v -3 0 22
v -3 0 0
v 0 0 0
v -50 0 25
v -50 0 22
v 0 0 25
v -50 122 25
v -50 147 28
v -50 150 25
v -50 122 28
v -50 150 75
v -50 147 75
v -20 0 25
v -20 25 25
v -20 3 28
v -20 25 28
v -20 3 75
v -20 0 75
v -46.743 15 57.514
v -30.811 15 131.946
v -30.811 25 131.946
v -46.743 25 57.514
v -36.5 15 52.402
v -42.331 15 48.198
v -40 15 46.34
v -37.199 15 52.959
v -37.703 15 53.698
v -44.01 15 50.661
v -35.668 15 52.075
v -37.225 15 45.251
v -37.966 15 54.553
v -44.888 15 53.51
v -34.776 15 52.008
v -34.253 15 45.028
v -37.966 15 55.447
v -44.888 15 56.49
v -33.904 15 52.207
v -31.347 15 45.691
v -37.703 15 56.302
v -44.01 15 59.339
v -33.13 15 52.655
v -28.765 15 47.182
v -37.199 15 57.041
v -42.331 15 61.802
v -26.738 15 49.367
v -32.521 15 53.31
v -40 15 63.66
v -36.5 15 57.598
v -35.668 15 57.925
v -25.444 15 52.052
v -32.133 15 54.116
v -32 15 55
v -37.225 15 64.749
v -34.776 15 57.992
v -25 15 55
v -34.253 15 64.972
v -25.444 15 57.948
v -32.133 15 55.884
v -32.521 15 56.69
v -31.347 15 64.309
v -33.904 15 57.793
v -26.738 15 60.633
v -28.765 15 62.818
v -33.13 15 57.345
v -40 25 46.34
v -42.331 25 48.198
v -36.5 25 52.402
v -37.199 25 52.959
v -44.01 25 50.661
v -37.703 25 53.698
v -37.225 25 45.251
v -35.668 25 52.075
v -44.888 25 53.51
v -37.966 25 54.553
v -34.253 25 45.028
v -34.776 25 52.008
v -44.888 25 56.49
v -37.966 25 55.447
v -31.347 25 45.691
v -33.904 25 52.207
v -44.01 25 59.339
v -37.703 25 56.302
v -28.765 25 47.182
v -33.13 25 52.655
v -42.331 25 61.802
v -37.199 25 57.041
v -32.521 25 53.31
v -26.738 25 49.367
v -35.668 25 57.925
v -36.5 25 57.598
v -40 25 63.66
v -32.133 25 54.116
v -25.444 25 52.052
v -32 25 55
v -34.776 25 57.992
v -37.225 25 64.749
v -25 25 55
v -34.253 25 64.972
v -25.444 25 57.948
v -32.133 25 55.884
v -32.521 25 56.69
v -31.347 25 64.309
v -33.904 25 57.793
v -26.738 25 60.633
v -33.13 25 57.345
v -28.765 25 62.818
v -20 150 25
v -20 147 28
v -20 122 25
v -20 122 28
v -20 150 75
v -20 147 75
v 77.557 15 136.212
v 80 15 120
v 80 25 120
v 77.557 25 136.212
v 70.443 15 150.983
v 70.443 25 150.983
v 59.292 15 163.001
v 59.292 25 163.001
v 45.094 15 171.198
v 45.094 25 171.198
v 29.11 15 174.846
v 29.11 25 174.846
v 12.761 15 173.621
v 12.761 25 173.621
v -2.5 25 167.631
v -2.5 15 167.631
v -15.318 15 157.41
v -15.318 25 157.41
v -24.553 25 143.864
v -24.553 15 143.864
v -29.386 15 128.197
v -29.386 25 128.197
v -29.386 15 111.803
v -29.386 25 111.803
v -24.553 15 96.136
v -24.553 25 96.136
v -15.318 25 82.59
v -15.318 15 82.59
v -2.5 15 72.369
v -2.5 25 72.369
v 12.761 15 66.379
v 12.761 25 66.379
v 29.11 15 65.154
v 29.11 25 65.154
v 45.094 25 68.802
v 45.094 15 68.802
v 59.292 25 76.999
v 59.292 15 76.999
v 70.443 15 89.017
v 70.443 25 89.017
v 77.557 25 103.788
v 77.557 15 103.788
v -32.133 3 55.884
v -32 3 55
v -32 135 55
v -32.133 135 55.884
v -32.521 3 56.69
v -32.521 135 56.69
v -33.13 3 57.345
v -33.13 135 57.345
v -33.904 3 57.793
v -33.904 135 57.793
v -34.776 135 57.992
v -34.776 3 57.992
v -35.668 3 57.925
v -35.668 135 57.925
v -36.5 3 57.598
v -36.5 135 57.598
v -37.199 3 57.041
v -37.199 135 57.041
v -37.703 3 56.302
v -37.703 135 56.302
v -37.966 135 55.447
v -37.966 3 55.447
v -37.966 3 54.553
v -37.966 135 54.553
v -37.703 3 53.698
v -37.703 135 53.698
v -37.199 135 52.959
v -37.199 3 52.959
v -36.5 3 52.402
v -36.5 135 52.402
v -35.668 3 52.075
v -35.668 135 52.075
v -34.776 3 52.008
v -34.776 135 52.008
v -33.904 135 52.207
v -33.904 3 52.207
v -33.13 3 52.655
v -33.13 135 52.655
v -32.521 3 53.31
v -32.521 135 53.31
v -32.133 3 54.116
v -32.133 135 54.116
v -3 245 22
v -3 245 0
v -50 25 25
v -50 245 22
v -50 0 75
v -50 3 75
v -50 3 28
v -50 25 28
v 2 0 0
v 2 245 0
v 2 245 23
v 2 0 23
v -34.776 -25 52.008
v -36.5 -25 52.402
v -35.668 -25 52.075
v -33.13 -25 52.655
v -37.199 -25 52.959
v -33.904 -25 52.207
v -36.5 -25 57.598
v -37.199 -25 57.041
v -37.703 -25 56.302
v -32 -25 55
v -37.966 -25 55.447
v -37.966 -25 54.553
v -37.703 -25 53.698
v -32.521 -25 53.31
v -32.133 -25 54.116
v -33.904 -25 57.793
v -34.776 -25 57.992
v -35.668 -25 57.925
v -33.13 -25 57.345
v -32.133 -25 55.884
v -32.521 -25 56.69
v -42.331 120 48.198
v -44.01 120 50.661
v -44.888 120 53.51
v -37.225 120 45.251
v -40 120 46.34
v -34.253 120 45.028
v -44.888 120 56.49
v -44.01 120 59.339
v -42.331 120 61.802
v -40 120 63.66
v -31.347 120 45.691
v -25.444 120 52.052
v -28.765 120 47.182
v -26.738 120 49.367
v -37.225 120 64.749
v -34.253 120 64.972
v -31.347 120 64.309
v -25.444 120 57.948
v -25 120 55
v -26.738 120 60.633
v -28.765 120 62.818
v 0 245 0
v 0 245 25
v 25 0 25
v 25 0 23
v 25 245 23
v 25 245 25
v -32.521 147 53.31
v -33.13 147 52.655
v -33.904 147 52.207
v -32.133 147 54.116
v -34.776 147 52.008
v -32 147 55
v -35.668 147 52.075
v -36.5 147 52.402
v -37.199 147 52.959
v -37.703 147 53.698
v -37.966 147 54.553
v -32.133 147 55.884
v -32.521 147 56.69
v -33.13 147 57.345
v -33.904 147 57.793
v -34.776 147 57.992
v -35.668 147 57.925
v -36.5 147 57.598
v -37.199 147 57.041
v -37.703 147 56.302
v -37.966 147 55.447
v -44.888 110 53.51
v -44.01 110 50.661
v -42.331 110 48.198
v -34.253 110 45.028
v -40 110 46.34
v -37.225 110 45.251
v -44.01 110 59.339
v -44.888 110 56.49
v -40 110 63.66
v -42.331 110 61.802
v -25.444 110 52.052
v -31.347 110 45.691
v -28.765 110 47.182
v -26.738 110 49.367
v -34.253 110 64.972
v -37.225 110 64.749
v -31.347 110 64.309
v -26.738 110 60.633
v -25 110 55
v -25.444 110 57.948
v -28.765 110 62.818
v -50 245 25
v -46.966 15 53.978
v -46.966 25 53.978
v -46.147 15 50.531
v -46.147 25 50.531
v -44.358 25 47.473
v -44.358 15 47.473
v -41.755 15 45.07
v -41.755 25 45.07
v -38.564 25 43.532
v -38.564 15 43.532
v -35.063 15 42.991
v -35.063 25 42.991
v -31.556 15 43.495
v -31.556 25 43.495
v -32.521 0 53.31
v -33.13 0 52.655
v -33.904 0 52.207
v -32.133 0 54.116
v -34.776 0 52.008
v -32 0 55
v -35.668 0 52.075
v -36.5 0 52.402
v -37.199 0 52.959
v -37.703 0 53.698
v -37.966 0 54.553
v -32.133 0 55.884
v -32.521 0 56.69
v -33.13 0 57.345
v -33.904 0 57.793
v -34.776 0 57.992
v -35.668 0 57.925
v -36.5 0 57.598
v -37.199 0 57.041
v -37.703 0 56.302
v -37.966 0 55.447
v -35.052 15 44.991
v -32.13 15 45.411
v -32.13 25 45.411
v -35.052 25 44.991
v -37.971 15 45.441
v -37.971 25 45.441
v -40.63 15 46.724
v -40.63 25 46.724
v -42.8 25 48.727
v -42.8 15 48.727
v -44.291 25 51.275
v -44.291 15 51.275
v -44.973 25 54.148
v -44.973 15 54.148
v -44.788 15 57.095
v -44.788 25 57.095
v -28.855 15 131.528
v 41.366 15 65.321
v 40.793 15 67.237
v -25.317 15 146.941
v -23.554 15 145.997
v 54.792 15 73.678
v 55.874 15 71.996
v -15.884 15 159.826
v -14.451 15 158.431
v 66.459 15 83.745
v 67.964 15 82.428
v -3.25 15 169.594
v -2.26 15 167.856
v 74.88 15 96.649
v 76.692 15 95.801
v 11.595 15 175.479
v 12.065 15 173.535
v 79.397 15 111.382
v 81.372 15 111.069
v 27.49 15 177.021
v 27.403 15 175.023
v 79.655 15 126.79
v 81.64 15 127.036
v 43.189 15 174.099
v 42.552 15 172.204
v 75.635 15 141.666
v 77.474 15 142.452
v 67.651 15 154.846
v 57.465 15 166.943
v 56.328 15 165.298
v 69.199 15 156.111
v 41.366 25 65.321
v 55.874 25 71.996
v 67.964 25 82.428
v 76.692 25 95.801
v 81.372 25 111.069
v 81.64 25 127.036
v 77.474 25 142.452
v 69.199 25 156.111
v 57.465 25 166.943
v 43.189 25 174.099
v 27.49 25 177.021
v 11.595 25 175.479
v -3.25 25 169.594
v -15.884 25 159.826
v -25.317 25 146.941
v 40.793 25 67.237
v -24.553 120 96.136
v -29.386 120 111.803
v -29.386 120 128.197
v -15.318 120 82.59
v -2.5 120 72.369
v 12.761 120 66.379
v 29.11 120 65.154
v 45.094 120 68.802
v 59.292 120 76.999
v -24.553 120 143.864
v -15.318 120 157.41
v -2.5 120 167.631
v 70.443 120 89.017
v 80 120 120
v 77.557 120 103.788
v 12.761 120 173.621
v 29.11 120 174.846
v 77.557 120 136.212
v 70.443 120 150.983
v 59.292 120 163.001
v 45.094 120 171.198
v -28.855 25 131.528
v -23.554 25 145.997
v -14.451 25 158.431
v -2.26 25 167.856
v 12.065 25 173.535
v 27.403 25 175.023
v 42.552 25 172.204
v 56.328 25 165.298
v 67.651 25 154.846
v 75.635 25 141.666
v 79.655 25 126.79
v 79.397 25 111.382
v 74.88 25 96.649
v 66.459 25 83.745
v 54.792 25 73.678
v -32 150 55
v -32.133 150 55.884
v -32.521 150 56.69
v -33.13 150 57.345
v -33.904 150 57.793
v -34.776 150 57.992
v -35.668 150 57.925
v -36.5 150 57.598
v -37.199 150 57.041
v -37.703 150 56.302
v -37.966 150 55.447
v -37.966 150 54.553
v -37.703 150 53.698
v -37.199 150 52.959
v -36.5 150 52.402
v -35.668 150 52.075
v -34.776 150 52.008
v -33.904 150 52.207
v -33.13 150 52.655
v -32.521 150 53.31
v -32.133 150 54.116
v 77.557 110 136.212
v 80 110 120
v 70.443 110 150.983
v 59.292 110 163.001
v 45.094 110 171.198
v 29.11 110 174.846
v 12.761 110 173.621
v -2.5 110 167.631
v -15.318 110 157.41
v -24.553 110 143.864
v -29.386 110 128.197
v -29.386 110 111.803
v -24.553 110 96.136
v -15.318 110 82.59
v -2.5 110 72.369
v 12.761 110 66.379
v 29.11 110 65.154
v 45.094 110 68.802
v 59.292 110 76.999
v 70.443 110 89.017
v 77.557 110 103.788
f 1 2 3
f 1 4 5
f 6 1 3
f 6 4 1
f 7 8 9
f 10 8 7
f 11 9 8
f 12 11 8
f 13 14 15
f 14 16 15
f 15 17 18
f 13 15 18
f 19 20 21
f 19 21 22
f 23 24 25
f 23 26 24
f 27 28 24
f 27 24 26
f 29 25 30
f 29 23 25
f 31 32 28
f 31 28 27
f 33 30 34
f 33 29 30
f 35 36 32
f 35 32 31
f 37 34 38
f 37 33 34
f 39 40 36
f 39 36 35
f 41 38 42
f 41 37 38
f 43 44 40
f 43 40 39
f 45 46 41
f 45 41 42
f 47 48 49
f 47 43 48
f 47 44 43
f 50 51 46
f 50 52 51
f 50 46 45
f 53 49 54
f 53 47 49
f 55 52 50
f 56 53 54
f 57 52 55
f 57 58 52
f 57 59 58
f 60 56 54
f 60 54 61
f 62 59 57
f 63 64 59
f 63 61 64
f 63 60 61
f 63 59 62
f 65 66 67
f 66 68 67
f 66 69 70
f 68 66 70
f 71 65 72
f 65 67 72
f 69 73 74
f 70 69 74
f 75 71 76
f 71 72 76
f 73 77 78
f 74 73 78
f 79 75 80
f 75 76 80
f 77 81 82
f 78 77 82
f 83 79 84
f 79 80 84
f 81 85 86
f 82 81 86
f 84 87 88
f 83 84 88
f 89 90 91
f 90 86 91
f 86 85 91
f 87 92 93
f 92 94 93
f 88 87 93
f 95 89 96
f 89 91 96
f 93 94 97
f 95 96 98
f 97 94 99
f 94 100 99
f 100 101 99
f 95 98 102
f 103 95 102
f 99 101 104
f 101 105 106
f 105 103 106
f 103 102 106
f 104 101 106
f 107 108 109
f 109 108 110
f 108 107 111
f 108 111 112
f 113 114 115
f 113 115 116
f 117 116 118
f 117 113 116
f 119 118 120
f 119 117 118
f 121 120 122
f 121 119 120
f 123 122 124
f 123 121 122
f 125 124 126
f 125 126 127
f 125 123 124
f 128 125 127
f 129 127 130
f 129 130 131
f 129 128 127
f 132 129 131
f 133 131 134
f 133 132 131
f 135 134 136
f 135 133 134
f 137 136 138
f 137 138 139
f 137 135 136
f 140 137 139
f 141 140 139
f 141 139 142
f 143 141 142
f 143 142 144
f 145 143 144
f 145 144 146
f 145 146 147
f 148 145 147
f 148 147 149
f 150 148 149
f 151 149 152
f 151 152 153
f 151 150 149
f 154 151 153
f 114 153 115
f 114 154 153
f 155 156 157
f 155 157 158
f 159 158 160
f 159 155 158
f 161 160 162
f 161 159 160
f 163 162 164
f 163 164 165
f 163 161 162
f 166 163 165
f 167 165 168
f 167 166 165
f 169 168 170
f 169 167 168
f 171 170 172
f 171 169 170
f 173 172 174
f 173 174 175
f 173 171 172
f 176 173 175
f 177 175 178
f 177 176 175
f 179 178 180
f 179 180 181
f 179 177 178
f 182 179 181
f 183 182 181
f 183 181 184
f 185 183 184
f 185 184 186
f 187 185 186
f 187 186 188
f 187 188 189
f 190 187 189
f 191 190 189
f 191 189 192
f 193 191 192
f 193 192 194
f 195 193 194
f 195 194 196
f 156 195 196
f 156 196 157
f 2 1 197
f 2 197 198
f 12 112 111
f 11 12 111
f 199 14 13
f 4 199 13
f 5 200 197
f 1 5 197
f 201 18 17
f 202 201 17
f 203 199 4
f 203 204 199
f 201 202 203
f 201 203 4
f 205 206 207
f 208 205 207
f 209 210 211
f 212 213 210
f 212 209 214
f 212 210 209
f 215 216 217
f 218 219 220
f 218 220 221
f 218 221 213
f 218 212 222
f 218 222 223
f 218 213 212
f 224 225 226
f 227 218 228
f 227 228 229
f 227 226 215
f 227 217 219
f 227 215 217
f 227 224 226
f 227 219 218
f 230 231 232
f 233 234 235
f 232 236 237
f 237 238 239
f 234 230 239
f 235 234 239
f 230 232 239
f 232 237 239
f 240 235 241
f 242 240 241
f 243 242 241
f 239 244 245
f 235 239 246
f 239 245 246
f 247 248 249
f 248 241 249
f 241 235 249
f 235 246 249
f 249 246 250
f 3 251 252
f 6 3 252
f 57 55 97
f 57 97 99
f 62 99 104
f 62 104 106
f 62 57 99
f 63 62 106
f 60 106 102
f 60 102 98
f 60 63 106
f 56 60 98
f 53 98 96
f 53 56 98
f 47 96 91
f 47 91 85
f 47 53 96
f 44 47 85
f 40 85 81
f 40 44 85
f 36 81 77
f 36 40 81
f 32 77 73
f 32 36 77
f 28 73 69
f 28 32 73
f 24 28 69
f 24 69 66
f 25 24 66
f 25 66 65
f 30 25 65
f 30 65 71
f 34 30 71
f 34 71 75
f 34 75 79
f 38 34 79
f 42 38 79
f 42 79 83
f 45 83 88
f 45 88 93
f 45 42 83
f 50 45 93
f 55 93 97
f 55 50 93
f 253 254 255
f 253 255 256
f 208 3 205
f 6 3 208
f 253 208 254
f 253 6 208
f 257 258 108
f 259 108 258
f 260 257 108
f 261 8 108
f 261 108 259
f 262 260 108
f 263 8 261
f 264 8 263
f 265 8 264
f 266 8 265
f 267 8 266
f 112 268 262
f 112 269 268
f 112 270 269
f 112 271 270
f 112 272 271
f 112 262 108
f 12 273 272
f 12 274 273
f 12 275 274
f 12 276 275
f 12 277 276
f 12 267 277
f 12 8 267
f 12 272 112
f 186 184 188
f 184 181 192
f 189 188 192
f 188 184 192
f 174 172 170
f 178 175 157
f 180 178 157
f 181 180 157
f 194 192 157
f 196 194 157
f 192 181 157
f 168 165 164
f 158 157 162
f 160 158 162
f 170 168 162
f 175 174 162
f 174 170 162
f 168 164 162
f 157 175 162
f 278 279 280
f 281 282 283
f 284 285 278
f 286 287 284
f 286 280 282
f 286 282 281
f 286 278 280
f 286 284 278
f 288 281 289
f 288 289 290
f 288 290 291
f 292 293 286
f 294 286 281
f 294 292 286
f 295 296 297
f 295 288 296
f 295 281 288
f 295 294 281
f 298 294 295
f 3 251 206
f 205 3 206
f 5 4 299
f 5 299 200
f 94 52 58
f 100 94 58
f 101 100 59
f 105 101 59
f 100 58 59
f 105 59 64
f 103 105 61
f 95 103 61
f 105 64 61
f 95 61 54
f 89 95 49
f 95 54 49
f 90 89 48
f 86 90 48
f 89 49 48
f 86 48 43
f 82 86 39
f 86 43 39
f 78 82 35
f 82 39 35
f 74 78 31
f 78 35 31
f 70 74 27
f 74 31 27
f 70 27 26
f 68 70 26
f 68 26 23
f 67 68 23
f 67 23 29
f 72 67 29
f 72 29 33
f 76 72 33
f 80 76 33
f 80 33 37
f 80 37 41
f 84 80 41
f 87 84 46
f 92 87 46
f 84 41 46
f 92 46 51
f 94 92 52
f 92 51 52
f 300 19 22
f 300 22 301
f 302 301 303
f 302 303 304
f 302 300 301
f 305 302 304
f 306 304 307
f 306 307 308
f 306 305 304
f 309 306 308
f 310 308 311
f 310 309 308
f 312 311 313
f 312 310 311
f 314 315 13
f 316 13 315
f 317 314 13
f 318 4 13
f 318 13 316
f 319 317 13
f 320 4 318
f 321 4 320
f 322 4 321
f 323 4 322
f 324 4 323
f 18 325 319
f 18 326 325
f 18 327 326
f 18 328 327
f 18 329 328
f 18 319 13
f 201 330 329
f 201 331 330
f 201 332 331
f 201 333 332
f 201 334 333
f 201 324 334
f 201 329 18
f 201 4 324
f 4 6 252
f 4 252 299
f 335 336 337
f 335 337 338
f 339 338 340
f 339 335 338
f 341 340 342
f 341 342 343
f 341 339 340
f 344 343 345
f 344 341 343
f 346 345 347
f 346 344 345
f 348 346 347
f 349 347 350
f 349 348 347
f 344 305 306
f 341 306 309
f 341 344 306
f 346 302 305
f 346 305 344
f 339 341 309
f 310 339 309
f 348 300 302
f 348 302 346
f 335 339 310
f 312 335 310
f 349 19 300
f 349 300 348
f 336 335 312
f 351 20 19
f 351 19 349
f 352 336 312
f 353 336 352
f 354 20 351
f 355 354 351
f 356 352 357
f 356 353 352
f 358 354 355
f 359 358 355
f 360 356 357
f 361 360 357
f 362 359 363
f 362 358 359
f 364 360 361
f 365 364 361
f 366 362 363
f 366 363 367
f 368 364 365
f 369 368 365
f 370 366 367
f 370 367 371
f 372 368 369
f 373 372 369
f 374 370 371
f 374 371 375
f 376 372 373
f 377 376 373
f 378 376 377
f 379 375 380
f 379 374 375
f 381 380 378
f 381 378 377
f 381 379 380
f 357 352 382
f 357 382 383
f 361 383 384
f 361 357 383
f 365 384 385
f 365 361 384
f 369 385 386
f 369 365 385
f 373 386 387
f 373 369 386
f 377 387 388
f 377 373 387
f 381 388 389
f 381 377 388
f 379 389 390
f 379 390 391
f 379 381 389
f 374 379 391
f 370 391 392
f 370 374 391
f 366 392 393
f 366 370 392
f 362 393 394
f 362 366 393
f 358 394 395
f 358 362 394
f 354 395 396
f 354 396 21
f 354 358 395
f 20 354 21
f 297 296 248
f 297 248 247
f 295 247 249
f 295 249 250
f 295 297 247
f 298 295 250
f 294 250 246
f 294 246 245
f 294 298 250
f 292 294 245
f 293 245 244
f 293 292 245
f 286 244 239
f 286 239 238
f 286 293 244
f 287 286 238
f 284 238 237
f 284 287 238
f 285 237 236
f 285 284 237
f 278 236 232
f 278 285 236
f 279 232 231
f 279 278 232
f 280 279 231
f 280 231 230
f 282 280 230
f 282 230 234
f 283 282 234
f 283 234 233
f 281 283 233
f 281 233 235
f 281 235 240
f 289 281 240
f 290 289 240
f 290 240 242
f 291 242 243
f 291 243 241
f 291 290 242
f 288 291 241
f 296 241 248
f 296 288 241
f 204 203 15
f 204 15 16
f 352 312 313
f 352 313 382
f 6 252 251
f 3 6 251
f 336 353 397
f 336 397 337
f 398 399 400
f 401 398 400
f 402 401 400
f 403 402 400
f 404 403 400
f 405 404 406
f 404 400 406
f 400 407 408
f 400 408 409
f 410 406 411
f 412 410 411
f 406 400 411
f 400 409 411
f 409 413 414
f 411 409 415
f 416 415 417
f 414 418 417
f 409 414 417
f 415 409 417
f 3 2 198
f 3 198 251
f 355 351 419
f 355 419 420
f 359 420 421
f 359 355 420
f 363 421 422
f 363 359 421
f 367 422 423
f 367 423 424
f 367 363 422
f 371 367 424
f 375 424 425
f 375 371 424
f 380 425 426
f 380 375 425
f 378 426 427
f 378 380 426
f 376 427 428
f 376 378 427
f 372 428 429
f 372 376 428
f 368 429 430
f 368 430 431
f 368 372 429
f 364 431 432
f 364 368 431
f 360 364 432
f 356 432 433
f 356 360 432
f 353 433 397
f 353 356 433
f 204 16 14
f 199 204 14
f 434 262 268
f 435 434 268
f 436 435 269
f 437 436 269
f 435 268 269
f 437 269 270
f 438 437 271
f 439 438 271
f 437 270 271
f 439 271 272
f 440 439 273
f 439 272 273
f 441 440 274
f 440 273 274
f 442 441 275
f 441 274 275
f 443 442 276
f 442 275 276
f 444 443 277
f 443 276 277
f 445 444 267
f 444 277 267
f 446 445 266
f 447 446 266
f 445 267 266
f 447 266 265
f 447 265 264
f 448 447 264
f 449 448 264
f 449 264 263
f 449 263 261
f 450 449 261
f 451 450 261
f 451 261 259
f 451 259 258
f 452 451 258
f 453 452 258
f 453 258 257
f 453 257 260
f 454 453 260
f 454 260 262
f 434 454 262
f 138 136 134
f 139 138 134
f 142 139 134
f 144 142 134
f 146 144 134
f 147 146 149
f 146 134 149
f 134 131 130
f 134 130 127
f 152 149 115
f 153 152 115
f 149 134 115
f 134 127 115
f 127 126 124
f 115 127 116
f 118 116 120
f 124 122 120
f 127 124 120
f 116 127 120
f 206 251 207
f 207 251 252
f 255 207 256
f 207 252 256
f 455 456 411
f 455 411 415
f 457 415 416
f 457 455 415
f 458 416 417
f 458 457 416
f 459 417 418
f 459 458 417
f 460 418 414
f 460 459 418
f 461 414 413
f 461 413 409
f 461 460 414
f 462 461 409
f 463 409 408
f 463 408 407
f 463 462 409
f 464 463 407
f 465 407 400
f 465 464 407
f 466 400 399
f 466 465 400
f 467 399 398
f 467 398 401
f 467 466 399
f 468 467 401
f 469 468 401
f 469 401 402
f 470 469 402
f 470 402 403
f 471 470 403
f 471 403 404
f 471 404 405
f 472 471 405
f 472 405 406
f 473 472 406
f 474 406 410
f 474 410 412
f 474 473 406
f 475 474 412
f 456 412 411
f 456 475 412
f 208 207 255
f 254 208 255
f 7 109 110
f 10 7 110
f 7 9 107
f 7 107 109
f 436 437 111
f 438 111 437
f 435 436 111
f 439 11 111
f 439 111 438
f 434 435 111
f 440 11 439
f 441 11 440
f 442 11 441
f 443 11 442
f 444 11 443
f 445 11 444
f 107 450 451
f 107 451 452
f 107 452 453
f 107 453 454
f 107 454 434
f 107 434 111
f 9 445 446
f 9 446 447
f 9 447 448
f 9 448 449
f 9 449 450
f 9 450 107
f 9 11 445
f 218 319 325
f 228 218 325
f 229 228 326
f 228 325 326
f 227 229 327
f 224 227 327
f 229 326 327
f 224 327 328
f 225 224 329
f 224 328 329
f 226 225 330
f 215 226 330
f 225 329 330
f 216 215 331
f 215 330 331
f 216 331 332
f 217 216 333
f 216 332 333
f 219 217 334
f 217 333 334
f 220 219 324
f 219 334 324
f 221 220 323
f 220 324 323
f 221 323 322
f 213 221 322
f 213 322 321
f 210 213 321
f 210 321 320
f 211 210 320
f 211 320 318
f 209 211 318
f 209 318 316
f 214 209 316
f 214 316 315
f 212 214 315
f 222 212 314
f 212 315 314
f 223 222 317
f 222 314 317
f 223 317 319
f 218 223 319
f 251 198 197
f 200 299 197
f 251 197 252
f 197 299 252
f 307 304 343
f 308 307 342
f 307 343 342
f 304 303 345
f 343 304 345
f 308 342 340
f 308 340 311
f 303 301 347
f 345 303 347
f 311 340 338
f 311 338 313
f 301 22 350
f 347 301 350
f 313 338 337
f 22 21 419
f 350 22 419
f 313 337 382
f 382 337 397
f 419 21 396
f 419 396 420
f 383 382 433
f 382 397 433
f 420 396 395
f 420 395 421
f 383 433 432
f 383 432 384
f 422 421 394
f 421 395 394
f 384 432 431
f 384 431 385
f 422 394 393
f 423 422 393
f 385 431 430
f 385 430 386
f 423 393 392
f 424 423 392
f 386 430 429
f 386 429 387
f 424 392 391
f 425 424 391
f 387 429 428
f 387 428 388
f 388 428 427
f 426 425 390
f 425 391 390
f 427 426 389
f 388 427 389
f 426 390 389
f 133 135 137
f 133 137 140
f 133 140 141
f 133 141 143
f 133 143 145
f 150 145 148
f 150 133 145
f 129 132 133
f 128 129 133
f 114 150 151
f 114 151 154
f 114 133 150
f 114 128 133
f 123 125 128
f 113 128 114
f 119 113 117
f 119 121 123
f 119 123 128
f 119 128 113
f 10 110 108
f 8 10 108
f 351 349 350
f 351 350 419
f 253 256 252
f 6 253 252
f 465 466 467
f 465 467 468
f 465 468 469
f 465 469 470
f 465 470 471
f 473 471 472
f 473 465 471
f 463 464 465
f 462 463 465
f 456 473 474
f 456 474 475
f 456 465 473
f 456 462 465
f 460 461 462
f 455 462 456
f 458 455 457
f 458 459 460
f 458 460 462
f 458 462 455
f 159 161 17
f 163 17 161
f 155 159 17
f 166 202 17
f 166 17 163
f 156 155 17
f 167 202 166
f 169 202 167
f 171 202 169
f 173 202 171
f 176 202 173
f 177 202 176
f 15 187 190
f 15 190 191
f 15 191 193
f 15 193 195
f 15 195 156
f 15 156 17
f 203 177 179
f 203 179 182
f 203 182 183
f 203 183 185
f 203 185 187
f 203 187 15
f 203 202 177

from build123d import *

# Parameters (mm, degrees)
F3_DEPTH       = 245
F5_DEPTH       = 245
F7_DEPTH       = 30
F8_R           = 3
F9_DEPTH       = 245.001
F10_R          = 3
F11_DEPTH      = 135
F11_DEPTH_BACK = 25
F12_R          = 55
F13_DEPTH      = 10
F12_R_2        = 10
F12_R_3        = 3
F14_R          = 55
F15_DEPTH      = 10
F14_R_2        = 10
F17_DEPTH      = 10


with BuildPart() as f3:
    # F2 (on Front) → F3 (new body)
    with BuildSketch(Plane.XZ):
        Polygon((0, 25), (0, 0), (2, 0), (2, 23), (25, 23), (25, 25), align=None)
    extrude(amount=-F3_DEPTH)


with BuildPart() as f5:
    # F4 (on Front) → F5 (new body)
    with BuildSketch(Plane.XZ):
        Polygon((-3, 0), (0, 0), (0, 25), (-50, 25), (-50, 22), (-3, 22), align=None)
    extrude(amount=-F5_DEPTH)


with BuildPart() as f7:
    # F6 (on face) → F7 (new body)
    with BuildSketch(Plane(origin=(-50, 0, 0), x_dir=(0, -1, 0), z_dir=(-1, 0, 0))):
        Polygon((-25, 25), (0, 25), (0, 75), (-3, 75), (-3, 28), (-25, 28), align=None)
    extrude(amount=-F7_DEPTH)


with BuildPart() as f7b:
    # F6 (on face) → F7, piece 2 (new body)
    with BuildSketch(Plane(origin=(-50, 0, 0), x_dir=(0, -1, 0), z_dir=(-1, 0, 0))):
        Polygon((-150, 75), (-150, 25), (-122, 25), (-122, 28), (-147, 28), (-147, 75), align=None)
    extrude(amount=-F7_DEPTH)


with BuildPart() as f9_tool:
    # F8 (on face) → F9 (new body, through all)
    with BuildSketch(Plane.XZ):
        with Locations((-35, 55)):
            Circle(F8_R)
    extrude(amount=-F9_DEPTH)


with BuildPart() as f7_1:
    add(f7.part)

    # F9: cut by f9_tool
    add(f9_tool.part, mode=Mode.SUBTRACT)

    # F10 (on Front) → F11 (join, two sides)
    with BuildSketch(Plane.XZ) as f11_sk:
        with Locations((-35, 55)):
            Circle(F10_R)
    extrude(amount=-F11_DEPTH)
    extrude(f11_sk.sketch, amount=F11_DEPTH_BACK)


with BuildPart() as f7b_1:
    add(f7b.part)

    # F9: cut by f9_tool
    add(f9_tool.part, mode=Mode.SUBTRACT)


with BuildPart() as f13:
    # F12 (on offset) → F13 (new body)
    with BuildSketch(Plane.XZ.offset(-15)):
        with Locations((25, 120)):
            Circle(F12_R)
    extrude(amount=-F13_DEPTH)


with BuildPart() as f13b:
    # F12 (on offset) → F13, piece 2 (new body)
    with BuildSketch(Plane.XZ.offset(-15)):
        with Locations((-35, 55)):
            Circle(F12_R_2)
        with Locations((-35, 55)):
            Circle(F12_R_3, mode=Mode.SUBTRACT)
    extrude(amount=-F13_DEPTH)


with BuildPart() as f15:
    # F14 (on offset) → F15 (new body)
    with BuildSketch(Plane.XZ.offset(-110)):
        with Locations((25, 120)):
            Circle(F14_R)
    extrude(amount=-F15_DEPTH)


with BuildPart() as f15b:
    # F14 (on offset) → F15, piece 2 (new body)
    with BuildSketch(Plane.XZ.offset(-110)):
        with Locations((-35, 55)):
            Circle(F14_R_2)
    extrude(amount=-F15_DEPTH)


with BuildPart() as f17:
    # F16 (on offset) → F17 (new body)
    with BuildSketch(Plane.XZ.offset(-15)):
        with BuildLine():
            Line((-31.5563430121, 43.4948137083), (41.3660228249, 65.3214585208))
            ThreePointArc((41.3660228249, 65.3214585208), (63.713038751, 161.9391253135), (-30.8110399749, 131.9464395667))
            Line((-30.8110399749, 131.9464395667), (-46.7434809831, 57.513710297))
            ThreePointArc((-46.7434809831, 57.513710297), (-43.1458047472, 46.1753781906), (-31.5563430121, 43.4948137083))
        make_face()
        with BuildLine():
            Line((40.7925339952, 67.2374727593), (-32.1298318417, 45.4108279468))
            ThreePointArc((-32.1298318417, 45.4108279468), (-41.7892445342, 47.6449850729), (-44.7877823831, 57.0950899611))
            Line((-44.7877823831, 57.0950899611), (-28.8553413705, 131.5278192508))
            ThreePointArc((-28.8553413705, 131.5278192508), (62.3564785455, 160.4695184243), (40.7925339952, 67.2374727593))
        make_face(mode=Mode.SUBTRACT)
    extrude(amount=-F17_DEPTH)


solid = Compound([f3.part, f5.part, f7_1.part, f7b_1.part, f13.part, f13b.part, f15.part, f15b.part, f17.part])
